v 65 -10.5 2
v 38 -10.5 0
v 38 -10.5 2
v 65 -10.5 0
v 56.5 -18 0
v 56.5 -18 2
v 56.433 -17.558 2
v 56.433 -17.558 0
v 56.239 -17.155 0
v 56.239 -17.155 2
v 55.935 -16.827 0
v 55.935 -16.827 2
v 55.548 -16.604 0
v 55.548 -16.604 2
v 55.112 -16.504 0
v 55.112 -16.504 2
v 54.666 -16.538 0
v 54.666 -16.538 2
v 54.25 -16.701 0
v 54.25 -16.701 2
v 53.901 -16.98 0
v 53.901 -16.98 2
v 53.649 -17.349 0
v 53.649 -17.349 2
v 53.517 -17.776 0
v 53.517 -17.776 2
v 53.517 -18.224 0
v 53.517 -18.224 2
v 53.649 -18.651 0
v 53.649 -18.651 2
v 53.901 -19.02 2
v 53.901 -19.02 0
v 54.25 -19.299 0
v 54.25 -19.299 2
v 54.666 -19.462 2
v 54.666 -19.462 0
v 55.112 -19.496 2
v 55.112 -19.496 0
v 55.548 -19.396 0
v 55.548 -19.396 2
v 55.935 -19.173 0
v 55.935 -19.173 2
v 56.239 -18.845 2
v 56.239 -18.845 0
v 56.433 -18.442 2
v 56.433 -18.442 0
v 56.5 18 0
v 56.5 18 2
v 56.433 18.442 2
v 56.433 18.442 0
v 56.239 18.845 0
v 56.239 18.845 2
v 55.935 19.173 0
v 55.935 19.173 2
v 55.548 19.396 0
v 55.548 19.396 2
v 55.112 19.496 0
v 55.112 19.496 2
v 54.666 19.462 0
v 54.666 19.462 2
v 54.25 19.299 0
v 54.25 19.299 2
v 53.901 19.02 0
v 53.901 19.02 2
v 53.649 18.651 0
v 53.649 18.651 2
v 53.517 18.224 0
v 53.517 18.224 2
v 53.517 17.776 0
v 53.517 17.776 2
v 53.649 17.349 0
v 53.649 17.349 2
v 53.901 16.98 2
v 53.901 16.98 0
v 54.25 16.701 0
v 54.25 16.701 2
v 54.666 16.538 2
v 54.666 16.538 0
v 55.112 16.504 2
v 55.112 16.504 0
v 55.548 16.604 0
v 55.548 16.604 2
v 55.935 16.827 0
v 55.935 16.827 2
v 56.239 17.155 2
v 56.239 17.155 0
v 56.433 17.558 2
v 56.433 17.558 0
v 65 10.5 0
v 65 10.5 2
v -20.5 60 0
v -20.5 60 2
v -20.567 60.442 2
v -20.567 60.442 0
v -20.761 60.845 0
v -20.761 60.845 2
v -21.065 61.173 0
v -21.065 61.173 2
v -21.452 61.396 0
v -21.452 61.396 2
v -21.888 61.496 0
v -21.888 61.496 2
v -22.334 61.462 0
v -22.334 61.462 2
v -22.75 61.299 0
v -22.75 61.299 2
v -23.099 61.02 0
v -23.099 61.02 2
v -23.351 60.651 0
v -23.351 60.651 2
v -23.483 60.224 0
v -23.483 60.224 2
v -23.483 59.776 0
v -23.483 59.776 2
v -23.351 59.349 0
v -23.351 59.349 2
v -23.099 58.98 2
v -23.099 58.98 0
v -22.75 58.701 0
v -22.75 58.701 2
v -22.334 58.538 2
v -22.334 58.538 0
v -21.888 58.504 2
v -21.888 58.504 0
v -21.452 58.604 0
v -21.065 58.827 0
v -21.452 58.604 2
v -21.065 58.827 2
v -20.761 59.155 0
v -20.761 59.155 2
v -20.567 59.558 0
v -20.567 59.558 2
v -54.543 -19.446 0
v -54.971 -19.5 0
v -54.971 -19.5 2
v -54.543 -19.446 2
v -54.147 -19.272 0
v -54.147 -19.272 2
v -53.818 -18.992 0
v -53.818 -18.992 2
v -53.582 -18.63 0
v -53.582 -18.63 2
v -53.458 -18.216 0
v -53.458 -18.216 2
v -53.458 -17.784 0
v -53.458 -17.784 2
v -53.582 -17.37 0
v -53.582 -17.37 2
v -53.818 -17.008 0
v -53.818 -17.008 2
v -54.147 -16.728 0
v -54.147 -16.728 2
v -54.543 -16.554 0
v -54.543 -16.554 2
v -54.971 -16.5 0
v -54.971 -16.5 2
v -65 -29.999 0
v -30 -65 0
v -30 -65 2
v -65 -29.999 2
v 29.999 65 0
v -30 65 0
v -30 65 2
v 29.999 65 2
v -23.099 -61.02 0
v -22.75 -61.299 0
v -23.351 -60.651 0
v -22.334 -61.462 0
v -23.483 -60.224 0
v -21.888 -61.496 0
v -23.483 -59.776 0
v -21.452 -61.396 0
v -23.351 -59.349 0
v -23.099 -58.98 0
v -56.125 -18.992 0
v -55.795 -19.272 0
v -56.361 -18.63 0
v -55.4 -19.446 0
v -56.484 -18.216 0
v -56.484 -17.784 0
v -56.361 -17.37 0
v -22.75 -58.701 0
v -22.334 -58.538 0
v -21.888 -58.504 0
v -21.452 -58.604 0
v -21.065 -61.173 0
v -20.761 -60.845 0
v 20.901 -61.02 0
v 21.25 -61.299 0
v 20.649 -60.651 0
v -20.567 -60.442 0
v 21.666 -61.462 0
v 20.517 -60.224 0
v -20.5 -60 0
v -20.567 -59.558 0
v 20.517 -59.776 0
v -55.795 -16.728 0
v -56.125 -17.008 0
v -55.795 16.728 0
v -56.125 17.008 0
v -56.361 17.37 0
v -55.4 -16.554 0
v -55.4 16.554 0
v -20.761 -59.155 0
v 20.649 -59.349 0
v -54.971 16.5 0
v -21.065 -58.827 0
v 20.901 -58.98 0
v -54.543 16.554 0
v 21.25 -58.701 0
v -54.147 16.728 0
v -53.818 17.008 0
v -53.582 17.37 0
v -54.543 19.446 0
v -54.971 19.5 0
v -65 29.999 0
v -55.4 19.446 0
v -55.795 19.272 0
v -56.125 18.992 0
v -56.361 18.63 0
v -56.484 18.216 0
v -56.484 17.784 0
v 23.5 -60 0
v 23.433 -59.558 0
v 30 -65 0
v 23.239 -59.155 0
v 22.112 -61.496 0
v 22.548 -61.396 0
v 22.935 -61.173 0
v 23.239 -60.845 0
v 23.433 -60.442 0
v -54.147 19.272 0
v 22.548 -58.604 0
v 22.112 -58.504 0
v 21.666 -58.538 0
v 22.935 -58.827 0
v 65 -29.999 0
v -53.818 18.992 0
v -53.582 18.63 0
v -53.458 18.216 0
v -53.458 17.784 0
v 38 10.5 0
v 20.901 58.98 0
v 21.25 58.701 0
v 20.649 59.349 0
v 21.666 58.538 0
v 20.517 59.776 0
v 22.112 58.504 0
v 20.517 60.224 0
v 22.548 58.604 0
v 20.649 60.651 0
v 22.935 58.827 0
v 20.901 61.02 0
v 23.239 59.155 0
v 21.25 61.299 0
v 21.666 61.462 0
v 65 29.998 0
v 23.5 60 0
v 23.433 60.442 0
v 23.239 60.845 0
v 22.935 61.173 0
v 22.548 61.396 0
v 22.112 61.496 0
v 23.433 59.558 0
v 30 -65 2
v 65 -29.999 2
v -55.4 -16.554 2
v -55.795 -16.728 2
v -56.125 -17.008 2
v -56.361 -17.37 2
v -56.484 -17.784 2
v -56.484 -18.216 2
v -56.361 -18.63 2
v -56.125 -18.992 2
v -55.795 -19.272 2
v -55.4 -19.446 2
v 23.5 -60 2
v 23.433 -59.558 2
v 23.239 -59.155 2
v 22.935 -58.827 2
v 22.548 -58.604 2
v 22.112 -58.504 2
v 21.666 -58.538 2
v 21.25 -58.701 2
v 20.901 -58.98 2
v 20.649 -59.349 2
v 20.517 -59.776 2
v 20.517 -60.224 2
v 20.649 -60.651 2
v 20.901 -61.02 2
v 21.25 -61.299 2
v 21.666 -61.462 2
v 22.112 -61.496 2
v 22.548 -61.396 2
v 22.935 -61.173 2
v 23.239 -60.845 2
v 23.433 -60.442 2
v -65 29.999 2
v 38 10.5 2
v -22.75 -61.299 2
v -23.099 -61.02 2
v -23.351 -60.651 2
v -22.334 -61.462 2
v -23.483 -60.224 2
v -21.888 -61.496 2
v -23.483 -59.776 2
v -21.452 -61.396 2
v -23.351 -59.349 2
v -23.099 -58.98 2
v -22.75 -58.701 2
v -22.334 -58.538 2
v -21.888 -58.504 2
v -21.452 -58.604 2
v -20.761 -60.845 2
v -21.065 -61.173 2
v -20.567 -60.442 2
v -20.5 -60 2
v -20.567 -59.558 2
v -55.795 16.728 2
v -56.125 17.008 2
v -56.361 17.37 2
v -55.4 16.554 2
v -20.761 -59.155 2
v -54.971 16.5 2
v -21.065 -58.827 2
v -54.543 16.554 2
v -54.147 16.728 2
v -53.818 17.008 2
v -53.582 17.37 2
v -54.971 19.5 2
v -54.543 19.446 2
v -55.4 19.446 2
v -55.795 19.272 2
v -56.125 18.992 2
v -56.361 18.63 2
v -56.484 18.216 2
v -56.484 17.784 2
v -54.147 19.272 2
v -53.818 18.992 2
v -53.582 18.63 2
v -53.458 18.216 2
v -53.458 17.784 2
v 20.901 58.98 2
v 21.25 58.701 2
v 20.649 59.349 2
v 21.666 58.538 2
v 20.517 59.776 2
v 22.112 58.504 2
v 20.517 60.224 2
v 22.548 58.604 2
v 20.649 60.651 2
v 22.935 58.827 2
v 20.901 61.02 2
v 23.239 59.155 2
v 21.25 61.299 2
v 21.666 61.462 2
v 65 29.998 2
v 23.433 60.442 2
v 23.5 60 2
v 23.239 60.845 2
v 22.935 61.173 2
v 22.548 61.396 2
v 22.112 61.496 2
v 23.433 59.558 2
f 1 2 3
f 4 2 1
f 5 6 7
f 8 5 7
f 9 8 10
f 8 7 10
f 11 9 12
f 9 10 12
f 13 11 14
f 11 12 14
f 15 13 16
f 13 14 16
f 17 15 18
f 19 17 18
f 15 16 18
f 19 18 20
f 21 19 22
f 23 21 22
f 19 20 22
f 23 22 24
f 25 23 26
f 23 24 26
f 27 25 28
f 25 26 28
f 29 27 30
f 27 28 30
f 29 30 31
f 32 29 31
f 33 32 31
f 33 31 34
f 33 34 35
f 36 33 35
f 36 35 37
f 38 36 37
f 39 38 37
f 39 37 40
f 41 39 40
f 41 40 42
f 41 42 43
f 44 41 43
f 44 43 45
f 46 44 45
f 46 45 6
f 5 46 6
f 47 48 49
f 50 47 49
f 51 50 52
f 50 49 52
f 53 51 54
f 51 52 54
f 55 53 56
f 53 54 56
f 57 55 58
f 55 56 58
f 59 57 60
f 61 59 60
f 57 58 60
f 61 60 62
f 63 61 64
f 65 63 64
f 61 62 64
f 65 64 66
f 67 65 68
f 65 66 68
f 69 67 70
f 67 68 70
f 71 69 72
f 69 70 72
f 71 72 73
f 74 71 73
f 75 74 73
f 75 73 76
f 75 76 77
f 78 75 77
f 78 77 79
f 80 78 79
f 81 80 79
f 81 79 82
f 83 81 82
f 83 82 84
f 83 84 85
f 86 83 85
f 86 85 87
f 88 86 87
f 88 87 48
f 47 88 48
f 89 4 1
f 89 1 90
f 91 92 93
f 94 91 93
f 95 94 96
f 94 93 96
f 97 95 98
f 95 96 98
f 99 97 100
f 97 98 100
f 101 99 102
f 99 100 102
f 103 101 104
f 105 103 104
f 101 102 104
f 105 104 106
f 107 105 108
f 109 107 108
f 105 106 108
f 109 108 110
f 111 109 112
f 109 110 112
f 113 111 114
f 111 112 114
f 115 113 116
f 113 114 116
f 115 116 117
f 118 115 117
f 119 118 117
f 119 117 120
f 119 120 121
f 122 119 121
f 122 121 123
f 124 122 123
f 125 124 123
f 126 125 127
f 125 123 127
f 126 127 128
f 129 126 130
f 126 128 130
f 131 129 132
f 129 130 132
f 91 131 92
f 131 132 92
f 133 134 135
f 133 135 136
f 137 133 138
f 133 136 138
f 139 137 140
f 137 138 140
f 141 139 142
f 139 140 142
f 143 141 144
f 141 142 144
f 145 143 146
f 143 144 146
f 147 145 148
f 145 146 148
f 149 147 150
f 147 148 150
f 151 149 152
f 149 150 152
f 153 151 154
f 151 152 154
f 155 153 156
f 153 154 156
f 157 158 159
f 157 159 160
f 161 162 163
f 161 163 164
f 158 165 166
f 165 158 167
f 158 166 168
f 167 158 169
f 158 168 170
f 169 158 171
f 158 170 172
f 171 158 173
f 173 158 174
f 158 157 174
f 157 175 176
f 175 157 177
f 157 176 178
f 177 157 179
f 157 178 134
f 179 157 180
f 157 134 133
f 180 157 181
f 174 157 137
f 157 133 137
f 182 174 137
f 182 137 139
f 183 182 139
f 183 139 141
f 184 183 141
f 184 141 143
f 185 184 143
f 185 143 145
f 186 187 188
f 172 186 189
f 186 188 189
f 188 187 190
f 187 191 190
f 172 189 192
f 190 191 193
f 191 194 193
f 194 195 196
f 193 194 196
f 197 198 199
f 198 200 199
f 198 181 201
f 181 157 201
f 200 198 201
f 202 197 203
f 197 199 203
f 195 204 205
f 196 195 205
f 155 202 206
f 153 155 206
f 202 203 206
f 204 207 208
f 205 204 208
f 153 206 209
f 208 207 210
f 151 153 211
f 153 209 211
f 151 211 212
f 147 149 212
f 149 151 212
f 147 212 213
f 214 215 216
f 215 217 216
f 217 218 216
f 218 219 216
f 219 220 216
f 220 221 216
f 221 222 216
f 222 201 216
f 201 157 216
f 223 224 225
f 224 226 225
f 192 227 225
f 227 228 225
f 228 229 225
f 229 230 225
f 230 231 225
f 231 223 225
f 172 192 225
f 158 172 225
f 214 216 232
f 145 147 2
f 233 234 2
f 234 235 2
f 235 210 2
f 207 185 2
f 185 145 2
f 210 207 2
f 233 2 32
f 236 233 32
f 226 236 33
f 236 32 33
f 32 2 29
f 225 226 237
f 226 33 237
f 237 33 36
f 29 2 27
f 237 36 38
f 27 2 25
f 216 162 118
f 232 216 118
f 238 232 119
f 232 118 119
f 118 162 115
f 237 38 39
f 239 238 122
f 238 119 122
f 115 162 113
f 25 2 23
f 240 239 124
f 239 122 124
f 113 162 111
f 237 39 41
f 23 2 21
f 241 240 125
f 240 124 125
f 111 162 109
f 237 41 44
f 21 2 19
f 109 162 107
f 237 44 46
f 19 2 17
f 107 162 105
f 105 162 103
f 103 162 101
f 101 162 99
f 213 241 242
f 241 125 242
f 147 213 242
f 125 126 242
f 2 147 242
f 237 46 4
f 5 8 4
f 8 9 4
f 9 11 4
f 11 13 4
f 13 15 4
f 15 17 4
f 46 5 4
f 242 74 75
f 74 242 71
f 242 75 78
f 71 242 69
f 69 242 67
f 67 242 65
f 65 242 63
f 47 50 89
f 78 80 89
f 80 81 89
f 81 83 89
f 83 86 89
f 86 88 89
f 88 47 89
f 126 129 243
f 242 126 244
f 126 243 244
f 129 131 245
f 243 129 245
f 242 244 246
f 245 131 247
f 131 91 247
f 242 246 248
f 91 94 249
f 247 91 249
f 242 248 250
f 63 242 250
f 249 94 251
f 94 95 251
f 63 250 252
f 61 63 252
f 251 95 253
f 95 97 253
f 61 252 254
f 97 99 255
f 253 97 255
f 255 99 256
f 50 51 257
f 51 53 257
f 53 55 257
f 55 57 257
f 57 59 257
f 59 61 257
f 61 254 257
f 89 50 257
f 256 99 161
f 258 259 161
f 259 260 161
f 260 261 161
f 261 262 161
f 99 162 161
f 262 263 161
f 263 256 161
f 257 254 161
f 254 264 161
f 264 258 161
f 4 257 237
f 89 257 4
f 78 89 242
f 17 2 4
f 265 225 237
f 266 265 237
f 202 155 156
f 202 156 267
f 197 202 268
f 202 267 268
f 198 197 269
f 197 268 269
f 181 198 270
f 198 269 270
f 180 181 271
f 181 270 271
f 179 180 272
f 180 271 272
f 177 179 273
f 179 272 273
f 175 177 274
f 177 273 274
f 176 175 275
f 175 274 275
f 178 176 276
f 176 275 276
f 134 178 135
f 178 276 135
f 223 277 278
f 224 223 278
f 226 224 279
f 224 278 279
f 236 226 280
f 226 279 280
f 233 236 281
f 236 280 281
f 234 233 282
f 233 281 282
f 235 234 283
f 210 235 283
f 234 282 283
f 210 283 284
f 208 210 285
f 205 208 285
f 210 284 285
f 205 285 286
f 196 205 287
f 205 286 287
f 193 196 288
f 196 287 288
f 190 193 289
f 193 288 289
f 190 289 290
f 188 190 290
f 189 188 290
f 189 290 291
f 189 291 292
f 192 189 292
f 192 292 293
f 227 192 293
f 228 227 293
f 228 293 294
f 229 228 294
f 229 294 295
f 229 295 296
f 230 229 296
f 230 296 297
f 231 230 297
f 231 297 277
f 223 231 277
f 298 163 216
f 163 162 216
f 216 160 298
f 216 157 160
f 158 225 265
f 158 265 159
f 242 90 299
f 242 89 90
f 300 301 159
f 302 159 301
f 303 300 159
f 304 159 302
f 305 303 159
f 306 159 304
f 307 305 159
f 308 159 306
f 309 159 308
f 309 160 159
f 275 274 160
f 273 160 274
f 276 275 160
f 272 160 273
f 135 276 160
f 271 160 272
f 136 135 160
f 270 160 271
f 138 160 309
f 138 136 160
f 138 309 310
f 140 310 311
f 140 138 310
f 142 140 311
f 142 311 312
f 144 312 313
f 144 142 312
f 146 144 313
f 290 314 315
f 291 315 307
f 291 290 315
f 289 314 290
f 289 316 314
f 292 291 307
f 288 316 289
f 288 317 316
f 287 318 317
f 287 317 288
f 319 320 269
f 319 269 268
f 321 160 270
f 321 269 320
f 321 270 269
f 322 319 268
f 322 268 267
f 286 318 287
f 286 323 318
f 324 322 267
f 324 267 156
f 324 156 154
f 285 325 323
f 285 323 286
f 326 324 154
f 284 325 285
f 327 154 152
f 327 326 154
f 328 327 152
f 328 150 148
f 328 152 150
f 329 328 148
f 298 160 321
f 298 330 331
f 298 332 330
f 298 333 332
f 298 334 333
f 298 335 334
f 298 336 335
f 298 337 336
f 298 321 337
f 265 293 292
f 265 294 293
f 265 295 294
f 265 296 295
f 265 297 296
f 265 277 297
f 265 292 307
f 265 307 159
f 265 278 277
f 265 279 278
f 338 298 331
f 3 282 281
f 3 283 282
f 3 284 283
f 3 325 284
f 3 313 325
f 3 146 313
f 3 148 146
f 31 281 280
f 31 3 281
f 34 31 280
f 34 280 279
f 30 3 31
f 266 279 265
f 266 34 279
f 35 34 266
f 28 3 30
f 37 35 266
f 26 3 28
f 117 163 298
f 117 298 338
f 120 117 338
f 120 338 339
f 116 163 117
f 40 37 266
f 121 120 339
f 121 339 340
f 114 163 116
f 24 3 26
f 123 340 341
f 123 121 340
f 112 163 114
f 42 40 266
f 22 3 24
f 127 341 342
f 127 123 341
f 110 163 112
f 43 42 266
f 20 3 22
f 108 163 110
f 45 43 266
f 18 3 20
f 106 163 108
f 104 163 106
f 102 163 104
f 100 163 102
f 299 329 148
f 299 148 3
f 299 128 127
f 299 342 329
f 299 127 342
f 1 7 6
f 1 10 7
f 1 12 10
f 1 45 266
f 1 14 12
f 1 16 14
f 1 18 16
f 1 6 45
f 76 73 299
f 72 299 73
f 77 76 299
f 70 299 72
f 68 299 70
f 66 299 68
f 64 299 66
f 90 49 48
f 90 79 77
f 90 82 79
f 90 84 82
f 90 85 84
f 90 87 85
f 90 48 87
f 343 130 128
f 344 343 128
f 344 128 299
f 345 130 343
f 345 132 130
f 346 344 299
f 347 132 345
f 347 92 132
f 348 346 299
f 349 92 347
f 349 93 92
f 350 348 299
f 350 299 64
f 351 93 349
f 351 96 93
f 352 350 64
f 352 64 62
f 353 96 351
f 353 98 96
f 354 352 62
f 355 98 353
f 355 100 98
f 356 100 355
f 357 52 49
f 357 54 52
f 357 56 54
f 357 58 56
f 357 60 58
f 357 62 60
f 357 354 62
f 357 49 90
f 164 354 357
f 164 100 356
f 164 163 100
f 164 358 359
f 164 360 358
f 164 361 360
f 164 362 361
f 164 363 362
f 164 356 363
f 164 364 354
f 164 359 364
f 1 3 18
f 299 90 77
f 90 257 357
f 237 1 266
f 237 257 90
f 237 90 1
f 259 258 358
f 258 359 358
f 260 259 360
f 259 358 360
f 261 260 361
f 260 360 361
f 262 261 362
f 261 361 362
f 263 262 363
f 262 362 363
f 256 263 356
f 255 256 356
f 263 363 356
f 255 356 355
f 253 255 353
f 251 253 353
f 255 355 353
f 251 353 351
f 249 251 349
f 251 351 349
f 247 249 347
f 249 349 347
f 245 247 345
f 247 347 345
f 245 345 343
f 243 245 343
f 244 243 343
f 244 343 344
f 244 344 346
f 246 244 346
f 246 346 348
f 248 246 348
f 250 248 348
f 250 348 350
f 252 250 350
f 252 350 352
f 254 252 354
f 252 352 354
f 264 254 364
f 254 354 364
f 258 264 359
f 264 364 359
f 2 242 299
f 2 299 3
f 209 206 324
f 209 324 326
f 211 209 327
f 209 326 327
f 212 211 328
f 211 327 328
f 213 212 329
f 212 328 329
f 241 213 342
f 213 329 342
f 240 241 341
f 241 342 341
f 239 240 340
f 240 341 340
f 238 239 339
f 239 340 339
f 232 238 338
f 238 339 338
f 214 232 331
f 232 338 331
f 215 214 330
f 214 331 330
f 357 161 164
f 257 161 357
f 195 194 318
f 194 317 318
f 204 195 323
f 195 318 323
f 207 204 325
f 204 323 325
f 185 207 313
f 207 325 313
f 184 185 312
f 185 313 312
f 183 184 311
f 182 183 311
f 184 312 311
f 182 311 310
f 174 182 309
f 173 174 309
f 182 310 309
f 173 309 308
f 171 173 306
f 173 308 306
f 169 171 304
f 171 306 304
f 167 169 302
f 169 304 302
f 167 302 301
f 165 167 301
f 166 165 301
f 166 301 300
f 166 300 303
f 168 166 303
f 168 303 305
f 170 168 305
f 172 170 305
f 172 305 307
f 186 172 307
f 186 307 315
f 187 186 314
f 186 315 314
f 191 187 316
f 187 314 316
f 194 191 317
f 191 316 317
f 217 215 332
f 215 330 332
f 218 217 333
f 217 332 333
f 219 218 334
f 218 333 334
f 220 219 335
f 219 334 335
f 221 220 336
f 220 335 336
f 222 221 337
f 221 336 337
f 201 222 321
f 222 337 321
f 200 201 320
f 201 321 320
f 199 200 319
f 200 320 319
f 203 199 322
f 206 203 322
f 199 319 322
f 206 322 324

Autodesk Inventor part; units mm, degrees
ref_plane "YZ Plane" through (0, 0, 0) normal (1, 0, 0) x (0, 1, 0)
ref_plane "XZ Plane" through (0, 0, 0) normal (0, 1, 0) x (-1, 0, 0)
ref_plane "XY Plane" through (0, 0, 0) normal (0, 0, 1) x (1, 0, 0)
sketch "Sketch1" plane through (0, 0, 0) normal (0, 0, 1) x (1, 0, 0)
  line L0 (-65.00021, 64.999866) -> (65.00021, 64.999866)
  line L1 (65.00021, 64.999866) -> (65.00021, -64.999866)
  line L2 (65.00021, -64.999866) -> (-65.00021, -64.999866)
  line L3 (-65.00021, -64.999866) -> (-65.00021, 64.999866)
  line L4 (-65.00021, 64.999866) -> (65.00021, -64.999866) construction
  line L5 (65.00021, 64.999866) -> (-65.00021, -64.999866) construction
  line L6 (29.999974, -64.999866) -> (65.00021, -29.999445)
  line L7 (-29.999622, -64.999866) -> (-65.00021, -29.999464)
  line L8 (-29.999622, 64.999866) -> (-65.00021, 29.999464)
  line L9 (29.998617, 64.999866) -> (65.00021, 29.998087)
  line L10 (-13.50021, 64.999866) -> (116.50021, -64.999866) construction
  line L11 (64.999934, -10.4998) -> (38.000066, -10.4998)
  line L12 (38.000066, -10.4998) -> (38.000066, 10.4998)
  line L13 (38.000066, 10.4998) -> (64.999934, 10.4998)
  line L14 (64.999934, 10.4998) -> (64.999934, -10.4998)
  line L15 (64.999934, -10.4998) -> (38.000066, 10.4998) construction
  line L16 (38.000066, -10.4998) -> (64.999934, 10.4998) construction
  line L17 (-38.000066, -10.4998) -> (-64.999934, -10.4998)
  line L18 (-64.999934, -10.4998) -> (-64.999934, 10.4998)
  line L19 (-64.999934, 10.4998) -> (-38.000066, 10.4998)
  line L20 (-38.000066, 10.4998) -> (-38.000066, -10.4998)
  line L21 (-38.000066, -10.4998) -> (-64.999934, 10.4998) construction
  line L22 (-64.999934, -10.4998) -> (-38.000066, 10.4998) construction
  line L23 (16.970375, 2.121415) -> (-2.121415, -16.970375)
  line L24 (-2.121415, -16.970375) -> (-16.970375, -2.121415)
  line L25 (-16.970375, -2.121415) -> (2.121415, 16.970375)
  line L26 (2.121415, 16.970375) -> (16.970375, 2.121415)
  line L27 (-2.121415, -16.970375) -> (2.121415, 16.970375) construction
extrude "Extrusion1" add sketch "Sketch1" along normal blind 2 contours L0 L9 L1 L13 L12 L11 L6 L2 L7 L3 L17 L20 L19 L8 | L19 L20 L17 L3 | L1 L11 L12 L13 | L23 L24 L25 L26
sketch "Sketch2" plane through (0, 0, 2) normal (0, 0, 1) x (1, 0, 0)
  circle A0 centre (22, 60) radius 1.499868
  circle A1 centre (-22, 60) radius 1.499868
  circle A2 centre (22, -60) radius 1.499868
  circle A3 centre (-22, -60) radius 1.499868
  circle A4 centre (55, 18) radius 1.499868
  circle A5 centre (55, -18) radius 1.499868
  circle A6 centre (-55, 18) radius 1.499868
  circle A7 centre (-54.942641, 18) radius 1.499868
  circle A8 centre (-55, -18) radius 1.499868
  circle A9 centre (-54.942641, -18) radius 1.499868
  point P0 (-54.971321, 16.500406)
  point P1 (-54.971321, 19.499594)
  point P2 (-54.971321, -19.499594)
  point P3 (-54.971321, -16.500406)
extrude "Extrusion2" cut sketch "Sketch2" against normal blind 10
sketch "Sketch1 outline for Extrusion3" plane through (0, 0, 0) normal (0, 0, 1) x (1, 0, 0)
  line L0 (64.999934, -10.4998) -> (64.999934, 10.4998)
  line L1 (38.000066, -10.4998) -> (64.999934, -10.4998)
  line L2 (38.000066, 10.4998) -> (38.000066, -10.4998)
  line L3 (64.999934, 10.4998) -> (38.000066, 10.4998)
extrude "Extrusion3" cut sketch "Sketch1 outline for Extrusion3" along normal blind 10
properties part number "t960_power_distribution_board_TL2996_bottom"
